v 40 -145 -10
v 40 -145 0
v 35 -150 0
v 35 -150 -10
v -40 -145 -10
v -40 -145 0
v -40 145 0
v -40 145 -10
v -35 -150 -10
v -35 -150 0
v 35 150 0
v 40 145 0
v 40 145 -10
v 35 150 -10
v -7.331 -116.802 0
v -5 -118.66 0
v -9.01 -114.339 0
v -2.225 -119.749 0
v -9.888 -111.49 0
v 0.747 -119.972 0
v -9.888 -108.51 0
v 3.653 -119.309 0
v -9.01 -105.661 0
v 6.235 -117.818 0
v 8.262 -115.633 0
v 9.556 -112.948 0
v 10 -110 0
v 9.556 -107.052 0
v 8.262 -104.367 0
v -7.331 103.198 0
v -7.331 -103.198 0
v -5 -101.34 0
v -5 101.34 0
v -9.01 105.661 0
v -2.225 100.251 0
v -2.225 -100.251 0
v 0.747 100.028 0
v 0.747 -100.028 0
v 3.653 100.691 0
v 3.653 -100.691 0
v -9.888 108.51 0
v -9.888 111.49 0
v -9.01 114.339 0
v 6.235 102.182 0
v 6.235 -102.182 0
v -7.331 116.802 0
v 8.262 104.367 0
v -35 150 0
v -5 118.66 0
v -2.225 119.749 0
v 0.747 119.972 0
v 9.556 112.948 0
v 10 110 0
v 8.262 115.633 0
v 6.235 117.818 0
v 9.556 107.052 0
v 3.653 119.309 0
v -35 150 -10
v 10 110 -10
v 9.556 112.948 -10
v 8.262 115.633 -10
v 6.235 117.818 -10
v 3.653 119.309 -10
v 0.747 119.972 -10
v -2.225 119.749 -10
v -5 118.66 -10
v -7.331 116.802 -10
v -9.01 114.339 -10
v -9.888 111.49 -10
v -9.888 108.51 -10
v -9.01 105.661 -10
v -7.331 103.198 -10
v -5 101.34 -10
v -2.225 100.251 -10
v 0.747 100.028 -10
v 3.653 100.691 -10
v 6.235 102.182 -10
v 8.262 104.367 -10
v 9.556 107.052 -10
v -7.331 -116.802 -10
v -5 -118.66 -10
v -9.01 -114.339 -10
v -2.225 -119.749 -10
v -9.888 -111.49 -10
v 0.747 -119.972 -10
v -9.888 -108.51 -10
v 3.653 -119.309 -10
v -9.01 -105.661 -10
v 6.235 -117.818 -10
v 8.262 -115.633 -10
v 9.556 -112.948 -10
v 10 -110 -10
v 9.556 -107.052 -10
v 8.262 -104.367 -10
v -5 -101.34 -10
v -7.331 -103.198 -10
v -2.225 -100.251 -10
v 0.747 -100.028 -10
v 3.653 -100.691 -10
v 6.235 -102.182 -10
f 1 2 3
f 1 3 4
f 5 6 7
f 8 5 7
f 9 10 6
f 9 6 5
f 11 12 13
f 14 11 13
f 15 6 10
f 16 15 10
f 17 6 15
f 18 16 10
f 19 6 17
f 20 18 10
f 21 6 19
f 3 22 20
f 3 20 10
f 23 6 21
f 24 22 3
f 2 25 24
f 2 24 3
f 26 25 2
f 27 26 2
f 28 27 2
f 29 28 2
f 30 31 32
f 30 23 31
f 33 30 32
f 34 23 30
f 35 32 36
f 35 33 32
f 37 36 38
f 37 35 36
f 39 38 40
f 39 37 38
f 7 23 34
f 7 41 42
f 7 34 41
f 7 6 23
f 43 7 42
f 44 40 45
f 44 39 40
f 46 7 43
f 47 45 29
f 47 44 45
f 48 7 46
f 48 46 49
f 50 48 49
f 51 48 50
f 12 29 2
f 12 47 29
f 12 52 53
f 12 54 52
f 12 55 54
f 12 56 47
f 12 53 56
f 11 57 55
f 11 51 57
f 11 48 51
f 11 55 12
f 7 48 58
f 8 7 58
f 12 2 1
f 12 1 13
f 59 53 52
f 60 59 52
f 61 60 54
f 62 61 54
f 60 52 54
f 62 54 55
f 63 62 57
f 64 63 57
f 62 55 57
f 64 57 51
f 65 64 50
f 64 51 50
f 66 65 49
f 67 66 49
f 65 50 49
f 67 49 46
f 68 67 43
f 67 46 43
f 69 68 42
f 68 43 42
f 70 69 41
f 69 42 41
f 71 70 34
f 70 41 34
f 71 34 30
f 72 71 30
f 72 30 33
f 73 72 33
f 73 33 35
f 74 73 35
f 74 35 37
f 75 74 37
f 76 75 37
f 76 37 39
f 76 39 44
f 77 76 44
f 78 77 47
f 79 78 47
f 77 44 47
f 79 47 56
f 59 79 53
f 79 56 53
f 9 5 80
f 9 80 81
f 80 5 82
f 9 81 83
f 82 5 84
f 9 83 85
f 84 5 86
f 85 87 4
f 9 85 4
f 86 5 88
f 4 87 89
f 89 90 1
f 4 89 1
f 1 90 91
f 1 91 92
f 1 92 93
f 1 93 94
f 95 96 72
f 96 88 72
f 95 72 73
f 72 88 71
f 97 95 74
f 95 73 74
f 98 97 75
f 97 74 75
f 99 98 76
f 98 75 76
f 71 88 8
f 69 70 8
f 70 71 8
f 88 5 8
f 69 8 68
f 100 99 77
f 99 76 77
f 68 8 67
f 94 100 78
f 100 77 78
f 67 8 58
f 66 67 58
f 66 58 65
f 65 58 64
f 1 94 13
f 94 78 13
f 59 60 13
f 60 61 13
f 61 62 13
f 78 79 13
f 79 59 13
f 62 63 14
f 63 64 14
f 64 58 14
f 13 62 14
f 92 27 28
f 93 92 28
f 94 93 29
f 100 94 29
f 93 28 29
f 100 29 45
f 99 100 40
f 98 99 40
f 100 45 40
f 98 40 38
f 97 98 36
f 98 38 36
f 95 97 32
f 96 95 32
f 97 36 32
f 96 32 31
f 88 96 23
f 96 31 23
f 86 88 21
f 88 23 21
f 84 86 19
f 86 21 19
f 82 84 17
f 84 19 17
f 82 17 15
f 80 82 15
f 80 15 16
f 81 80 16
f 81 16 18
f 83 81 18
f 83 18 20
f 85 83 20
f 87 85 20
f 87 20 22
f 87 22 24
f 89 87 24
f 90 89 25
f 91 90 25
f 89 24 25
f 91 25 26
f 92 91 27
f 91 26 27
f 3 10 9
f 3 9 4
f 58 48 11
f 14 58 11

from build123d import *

# Parameters (mm, degrees)
F0_W     = 80
F0_H     = 300
F0_R     = 10
F1_DEPTH = 10
F2_SIZE2 = 5
F2_SIZE  = 5


with BuildPart() as f1:
    # F0 (on Top) → F1 (new body)
    with BuildSketch(Plane.XY):
        Rectangle(F0_W, F0_H)
        with Locations((0, -110)):
            Circle(F0_R, mode=Mode.SUBTRACT)
        with Locations((0, 110)):
            Circle(F0_R, mode=Mode.SUBTRACT)
    extrude(amount=-F1_DEPTH)

    # F2
    f2_edges = [f1.edges().sort_by_distance(p)[0] for p in [
        (40, 150, -5),
        (40, -150, -5),
        (-40, -150, -5),
        (-40, 150, -5),
    ]]
    chamfer(f2_edges, length=F2_SIZE, length2=F2_SIZE2)


solid = f1.part
